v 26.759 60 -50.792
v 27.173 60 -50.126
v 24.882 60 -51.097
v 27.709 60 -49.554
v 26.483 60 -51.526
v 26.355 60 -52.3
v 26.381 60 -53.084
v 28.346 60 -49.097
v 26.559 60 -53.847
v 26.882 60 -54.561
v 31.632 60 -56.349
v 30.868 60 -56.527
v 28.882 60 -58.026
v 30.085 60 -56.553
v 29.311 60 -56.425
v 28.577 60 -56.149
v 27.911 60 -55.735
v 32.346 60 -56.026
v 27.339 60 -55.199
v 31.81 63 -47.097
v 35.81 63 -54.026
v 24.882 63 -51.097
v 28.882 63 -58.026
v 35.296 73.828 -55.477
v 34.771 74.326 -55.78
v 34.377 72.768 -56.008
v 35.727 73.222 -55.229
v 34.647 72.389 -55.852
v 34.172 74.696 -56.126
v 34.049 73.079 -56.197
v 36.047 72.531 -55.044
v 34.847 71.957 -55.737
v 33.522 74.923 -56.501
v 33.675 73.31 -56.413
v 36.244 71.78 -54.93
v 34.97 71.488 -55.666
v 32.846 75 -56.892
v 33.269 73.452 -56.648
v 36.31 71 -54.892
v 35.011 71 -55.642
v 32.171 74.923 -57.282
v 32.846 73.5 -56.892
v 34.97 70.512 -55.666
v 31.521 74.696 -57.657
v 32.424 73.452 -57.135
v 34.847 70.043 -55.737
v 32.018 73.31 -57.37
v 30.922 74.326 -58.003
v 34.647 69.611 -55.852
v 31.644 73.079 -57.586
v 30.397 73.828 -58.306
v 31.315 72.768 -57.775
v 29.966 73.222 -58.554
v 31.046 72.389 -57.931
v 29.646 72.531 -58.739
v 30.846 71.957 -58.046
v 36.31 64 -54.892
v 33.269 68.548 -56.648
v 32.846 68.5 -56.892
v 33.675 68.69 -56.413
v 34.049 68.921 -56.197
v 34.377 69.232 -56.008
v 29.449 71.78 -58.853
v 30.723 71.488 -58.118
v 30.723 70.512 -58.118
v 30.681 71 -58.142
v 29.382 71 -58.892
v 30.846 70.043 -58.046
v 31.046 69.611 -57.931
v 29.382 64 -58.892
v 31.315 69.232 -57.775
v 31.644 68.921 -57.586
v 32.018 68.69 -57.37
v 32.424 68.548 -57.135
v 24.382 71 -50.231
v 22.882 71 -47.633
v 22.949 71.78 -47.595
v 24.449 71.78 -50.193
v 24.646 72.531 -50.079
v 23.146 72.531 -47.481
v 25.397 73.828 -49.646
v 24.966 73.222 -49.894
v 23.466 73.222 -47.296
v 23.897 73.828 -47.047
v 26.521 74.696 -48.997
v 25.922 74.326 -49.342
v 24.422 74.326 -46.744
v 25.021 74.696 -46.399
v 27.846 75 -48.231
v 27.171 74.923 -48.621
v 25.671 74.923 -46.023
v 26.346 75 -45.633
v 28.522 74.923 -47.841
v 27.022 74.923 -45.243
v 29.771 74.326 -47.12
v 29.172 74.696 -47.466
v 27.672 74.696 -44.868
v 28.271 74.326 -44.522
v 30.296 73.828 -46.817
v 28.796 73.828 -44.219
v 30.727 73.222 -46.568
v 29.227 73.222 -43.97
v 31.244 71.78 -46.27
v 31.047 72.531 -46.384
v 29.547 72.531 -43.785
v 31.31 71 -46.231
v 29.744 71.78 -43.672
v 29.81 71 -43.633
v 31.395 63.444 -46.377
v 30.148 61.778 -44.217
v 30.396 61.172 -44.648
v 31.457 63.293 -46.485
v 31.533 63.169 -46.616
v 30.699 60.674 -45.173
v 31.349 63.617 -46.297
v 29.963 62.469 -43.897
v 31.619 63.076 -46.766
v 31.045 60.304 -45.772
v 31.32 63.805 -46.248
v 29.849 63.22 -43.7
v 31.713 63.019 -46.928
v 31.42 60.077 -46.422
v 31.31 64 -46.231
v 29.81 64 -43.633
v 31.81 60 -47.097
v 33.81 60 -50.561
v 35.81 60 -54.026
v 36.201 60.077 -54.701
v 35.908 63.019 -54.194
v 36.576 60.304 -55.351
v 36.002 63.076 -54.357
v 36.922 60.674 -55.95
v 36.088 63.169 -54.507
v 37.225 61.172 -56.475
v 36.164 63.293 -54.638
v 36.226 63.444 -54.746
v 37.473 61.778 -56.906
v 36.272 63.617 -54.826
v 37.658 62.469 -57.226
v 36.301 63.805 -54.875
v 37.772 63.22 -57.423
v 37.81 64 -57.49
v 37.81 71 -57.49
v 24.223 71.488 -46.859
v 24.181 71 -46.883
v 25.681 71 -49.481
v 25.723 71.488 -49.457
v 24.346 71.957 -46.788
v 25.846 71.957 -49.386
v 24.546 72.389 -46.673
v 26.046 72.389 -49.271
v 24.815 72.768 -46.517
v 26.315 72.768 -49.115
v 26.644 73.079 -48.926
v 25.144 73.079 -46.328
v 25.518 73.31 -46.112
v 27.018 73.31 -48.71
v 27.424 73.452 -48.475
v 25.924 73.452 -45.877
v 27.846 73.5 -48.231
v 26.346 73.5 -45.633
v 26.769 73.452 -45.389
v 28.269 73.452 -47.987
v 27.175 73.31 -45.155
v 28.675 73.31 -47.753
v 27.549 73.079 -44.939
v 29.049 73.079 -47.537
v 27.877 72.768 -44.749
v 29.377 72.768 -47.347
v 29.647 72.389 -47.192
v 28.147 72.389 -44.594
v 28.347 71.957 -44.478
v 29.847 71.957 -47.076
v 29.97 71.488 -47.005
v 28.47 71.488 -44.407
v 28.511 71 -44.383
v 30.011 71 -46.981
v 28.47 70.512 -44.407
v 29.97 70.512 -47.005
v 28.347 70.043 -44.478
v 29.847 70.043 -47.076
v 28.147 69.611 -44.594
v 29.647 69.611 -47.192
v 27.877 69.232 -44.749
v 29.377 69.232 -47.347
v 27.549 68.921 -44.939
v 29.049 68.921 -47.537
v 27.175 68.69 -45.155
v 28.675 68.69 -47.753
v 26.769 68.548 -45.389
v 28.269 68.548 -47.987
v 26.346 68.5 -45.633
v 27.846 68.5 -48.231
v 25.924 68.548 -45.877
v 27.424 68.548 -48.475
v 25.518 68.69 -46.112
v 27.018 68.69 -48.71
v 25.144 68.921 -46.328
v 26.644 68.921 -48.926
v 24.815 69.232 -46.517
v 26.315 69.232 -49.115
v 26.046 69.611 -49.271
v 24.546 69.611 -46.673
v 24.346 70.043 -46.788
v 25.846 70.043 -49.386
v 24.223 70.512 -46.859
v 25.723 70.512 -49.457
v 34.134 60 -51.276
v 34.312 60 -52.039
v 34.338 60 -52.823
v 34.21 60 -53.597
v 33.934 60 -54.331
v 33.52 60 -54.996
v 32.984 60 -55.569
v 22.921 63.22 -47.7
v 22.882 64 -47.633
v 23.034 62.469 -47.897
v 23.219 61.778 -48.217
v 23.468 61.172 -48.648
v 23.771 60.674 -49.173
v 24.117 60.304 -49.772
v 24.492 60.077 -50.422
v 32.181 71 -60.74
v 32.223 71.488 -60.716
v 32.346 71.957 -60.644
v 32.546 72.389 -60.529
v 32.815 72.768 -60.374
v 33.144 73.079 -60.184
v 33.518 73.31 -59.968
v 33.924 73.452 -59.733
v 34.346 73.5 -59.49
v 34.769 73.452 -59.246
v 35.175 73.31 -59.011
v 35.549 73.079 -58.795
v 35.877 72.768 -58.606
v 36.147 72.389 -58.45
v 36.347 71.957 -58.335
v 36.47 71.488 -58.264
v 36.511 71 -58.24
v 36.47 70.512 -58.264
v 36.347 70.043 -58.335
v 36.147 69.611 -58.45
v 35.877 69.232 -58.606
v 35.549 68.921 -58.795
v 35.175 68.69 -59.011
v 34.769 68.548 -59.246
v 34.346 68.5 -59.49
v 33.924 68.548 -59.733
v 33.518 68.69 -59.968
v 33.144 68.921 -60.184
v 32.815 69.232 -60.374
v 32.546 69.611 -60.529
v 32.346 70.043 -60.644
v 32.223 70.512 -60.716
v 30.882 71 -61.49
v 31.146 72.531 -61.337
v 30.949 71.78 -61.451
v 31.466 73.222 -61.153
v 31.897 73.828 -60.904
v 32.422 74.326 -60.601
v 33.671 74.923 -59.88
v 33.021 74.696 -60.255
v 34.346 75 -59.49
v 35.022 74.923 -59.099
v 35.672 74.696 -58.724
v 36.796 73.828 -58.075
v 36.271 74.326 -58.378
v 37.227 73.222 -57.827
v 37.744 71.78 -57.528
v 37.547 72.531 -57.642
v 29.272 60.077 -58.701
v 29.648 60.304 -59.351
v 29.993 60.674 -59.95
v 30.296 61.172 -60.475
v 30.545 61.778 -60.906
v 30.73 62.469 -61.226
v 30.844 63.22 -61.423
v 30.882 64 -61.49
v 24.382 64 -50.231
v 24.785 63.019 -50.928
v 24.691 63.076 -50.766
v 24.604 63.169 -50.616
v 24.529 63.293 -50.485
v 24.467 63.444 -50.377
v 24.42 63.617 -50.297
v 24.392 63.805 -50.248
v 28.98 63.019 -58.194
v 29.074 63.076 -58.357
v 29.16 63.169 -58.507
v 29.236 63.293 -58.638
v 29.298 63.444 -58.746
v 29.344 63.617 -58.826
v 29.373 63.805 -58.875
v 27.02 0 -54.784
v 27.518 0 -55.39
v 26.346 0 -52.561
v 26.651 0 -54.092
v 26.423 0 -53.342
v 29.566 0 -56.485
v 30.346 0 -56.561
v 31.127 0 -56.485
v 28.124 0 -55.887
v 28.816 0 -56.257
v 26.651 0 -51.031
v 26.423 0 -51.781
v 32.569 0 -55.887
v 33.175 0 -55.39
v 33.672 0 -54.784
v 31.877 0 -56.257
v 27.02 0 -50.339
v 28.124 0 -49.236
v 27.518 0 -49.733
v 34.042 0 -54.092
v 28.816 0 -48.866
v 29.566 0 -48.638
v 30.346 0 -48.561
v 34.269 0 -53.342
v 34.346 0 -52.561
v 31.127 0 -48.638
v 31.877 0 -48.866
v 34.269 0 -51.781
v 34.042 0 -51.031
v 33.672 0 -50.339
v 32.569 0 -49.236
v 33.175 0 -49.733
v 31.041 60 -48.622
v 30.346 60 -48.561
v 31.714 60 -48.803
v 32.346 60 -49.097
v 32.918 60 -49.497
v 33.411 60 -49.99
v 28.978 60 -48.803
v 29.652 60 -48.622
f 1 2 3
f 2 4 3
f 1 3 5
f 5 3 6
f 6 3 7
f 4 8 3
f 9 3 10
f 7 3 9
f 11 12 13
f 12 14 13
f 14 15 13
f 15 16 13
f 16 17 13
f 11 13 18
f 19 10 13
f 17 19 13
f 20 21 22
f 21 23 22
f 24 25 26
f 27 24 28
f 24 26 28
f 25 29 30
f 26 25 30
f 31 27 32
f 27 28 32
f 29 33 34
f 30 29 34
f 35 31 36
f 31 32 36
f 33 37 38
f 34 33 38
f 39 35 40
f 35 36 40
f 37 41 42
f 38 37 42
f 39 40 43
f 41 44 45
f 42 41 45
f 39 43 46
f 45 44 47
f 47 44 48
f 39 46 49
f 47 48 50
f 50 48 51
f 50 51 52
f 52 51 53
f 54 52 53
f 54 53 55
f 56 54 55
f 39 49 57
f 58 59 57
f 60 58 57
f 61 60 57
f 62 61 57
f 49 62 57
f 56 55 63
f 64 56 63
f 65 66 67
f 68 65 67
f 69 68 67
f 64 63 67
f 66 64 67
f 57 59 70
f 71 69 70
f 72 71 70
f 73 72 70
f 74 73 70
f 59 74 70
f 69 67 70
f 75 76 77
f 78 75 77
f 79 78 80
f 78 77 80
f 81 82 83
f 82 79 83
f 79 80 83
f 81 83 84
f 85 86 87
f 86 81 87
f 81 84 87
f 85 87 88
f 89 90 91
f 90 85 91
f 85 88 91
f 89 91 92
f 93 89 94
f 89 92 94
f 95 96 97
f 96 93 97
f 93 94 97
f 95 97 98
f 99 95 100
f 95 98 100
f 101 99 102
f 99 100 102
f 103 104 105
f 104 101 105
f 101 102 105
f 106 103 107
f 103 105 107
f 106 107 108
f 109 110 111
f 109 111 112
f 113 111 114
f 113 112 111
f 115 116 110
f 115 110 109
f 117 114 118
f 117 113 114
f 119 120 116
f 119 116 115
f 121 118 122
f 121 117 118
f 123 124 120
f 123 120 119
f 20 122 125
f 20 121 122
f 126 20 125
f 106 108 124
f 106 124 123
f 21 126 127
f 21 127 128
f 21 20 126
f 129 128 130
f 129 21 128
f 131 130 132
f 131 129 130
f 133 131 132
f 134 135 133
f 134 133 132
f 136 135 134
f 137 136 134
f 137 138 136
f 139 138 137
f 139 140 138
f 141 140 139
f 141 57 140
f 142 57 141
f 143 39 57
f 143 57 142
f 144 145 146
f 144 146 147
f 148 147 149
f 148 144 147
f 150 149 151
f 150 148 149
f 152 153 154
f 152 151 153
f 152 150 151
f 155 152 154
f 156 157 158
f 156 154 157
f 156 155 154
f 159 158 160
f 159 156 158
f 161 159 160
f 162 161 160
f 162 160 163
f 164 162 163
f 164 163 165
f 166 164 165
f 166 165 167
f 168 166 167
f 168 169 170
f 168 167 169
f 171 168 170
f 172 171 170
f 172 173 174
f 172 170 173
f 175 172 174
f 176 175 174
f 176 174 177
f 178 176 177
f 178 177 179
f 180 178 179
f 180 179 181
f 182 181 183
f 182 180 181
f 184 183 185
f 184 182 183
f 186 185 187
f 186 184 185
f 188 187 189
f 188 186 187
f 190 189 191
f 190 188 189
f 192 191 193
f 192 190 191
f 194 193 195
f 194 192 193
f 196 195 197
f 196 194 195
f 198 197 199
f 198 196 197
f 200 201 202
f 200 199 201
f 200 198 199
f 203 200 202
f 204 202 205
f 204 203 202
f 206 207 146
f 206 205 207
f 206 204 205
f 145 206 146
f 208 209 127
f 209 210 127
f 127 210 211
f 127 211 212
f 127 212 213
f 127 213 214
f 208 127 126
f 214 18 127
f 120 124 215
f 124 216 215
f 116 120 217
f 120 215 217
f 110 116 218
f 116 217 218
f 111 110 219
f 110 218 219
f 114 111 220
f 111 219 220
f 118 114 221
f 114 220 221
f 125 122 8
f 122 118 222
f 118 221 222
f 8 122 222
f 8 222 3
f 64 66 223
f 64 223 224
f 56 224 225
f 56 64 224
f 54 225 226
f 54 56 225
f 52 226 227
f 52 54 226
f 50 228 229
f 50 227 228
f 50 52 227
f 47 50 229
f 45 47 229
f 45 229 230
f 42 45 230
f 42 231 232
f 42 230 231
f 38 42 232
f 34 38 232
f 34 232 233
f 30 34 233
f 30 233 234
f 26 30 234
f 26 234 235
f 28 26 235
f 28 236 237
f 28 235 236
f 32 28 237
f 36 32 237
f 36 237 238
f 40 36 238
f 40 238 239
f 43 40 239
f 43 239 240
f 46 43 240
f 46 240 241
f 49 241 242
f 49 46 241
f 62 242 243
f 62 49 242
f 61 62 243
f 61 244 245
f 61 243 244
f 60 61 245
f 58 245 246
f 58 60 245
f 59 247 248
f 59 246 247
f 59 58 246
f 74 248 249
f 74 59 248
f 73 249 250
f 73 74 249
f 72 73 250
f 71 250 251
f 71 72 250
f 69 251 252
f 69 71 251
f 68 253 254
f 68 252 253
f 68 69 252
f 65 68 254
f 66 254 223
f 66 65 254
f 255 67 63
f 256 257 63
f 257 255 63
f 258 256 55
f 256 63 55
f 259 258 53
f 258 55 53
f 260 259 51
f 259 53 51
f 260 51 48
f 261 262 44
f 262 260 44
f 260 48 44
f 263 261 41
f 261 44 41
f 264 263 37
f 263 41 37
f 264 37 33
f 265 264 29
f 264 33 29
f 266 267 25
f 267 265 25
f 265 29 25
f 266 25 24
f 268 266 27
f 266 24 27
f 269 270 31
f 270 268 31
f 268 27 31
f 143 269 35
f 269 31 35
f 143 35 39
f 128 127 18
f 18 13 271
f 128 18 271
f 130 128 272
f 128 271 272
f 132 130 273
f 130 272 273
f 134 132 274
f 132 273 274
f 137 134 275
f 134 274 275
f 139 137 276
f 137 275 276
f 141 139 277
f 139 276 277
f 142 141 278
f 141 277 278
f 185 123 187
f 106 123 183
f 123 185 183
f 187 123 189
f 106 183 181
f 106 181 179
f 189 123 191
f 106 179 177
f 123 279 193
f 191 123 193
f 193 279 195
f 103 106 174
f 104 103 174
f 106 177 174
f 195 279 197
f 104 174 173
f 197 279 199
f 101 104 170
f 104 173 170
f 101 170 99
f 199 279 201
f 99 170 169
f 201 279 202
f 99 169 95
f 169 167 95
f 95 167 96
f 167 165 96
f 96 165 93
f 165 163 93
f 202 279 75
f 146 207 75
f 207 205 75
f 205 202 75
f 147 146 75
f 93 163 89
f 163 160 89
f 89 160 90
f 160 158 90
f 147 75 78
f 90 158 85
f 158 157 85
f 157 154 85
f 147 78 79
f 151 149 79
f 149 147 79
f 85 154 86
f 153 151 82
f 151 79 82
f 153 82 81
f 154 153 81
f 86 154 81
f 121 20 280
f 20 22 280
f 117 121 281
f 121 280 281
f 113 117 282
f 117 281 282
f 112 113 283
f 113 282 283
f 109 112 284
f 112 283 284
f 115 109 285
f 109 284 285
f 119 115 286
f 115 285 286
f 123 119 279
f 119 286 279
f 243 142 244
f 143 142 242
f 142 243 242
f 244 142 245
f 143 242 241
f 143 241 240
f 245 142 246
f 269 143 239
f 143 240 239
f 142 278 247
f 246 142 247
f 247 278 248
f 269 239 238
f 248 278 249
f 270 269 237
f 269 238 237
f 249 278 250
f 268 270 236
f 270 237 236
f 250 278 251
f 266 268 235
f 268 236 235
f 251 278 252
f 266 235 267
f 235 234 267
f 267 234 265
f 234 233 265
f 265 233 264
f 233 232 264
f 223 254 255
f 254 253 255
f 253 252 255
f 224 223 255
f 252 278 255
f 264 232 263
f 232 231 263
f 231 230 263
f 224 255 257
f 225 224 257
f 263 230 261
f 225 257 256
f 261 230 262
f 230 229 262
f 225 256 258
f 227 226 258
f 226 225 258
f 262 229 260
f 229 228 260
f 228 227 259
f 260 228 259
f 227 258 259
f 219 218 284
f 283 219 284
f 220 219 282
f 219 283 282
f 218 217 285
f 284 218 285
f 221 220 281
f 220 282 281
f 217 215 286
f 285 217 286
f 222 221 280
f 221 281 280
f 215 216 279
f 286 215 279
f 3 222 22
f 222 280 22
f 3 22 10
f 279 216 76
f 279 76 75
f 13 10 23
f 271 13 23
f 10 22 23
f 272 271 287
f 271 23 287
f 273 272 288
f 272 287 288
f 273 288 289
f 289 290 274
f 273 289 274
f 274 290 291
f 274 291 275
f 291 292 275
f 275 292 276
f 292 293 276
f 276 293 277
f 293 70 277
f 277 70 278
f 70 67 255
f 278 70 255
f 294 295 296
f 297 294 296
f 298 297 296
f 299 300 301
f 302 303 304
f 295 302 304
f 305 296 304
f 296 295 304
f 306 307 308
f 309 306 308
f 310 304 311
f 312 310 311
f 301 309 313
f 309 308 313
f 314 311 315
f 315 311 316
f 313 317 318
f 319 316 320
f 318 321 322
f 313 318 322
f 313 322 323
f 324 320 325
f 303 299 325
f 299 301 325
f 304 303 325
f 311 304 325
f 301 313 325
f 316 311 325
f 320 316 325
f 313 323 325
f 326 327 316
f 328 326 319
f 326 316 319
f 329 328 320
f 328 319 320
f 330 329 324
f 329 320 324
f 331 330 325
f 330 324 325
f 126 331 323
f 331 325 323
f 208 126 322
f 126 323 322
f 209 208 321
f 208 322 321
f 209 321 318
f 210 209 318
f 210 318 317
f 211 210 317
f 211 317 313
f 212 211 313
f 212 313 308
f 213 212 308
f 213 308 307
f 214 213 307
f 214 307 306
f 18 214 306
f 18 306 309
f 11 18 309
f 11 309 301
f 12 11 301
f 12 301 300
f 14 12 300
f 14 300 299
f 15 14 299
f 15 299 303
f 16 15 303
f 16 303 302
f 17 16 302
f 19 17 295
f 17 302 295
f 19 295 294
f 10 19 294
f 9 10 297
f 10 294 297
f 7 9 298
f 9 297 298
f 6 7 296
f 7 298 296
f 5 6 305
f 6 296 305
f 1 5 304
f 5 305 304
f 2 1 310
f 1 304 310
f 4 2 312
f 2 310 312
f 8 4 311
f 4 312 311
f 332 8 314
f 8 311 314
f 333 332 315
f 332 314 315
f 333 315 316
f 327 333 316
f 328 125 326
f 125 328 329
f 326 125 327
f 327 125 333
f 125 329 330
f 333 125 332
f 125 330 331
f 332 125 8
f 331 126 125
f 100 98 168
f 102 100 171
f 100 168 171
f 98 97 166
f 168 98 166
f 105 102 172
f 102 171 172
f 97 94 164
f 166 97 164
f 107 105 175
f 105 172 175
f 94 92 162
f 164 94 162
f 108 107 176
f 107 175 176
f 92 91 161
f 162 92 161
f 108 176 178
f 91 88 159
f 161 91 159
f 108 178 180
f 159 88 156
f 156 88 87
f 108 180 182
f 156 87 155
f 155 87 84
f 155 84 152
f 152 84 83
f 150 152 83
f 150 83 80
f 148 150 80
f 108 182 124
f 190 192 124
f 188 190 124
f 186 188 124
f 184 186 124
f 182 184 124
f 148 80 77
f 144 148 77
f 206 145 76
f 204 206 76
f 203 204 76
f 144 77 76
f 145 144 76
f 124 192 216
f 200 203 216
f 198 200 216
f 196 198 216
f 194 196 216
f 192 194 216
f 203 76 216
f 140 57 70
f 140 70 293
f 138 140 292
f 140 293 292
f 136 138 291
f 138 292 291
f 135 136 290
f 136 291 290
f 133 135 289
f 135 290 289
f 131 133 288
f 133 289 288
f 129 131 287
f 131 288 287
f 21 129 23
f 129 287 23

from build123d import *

# Parameters (mm, degrees)
BASE_LINK_OUTLINE_R     = 5
BASE_LINK_OUTLINE_R_2   = 4
BASE_LINK_DEPTH         = 60
SKETCH3_R               = 4
BOSS_EXTRUDE1_DEPTH     = 60
BOSS_EXTRUDE2_DEPTH     = 4
CUT_EXTRUDE1_DEPTH      = 78.510329968
CUT_EXTRUDE1_DEPTH_BACK = 78.510329968
SKETCH5_R               = 2.5


# Read off the part's stored shape, not the designer's step: base_link
with BuildPart() as part:
    # base_link outline → base_link (new body)
    with BuildSketch(Plane(origin=(0, 0, 0), x_dir=(1, 0, 0), z_dir=(0, 1, 0))):
        with Locations((30.34635, 52.561420024)):
            Circle(BASE_LINK_OUTLINE_R)
        with Locations((30.34635, 52.561420024)):
            Circle(BASE_LINK_OUTLINE_R_2, mode=Mode.SUBTRACT)
    extrude(amount=BASE_LINK_DEPTH)


with BuildPart() as body_2:
    # Sketch3 → Boss-Extrude1 (new body)
    with BuildSketch(Plane(origin=(0, 0, 0), x_dir=(1, 0, 0), z_dir=(0, 1, 0))):
        with Locations(Location((30.34635, 52.561420024, 0), (0, 0, 270))):
            Circle(SKETCH3_R)
    extrude(amount=BOSS_EXTRUDE1_DEPTH)

    # Sketch4 → Boss-Extrude2 (add, symmetric)
    with BuildSketch(Plane(origin=(0, 0, 0), x_dir=(-0.49999999999999994, 0, 0.8660254037844387), z_dir=(-0.8660254037844386, 0, -0.4999999999999999))):
        with BuildLine():
            Line((-68.6927, 75), (-65.6927, 75))
            Line((-65.6927, 75), (-65.6927, 64))
            ThreePointArc((-65.6927, 64), (-65.399806781, 63.292893219), (-64.6927, 63))
            Line((-64.6927, 63), (-56.6927, 63))
            ThreePointArc((-56.6927, 63), (-55.985593219, 63.292893219), (-55.6927, 64))
            Line((-55.6927, 64), (-55.6927, 75))
            Line((-55.6927, 75), (-52.6927, 75))
            Line((-52.6927, 75), (-52.6927, 64))
            ThreePointArc((-52.6927, 64), (-53.864272875, 61.171572875), (-56.6927, 60))
            Line((-56.6927, 60), (-64.6927, 60))
            ThreePointArc((-64.6927, 60), (-67.521127125, 61.171572875), (-68.6927, 64))
            Line((-68.6927, 64), (-68.6927, 75))
        make_face()
    extrude(amount=BOSS_EXTRUDE2_DEPTH, both=True)

    # Sketch5 → Cut-Extrude1 (cut, two sides: drawn at the far end of the back side and taken through both)
    with BuildSketch(Plane(origin=(34.34635, 0, -59.489623255), x_dir=(-0.8660254037844386, 0, -0.5), z_dir=(0.5000000000000001, 0, -0.8660254037844387)).offset(-CUT_EXTRUDE1_DEPTH_BACK)):
        with Locations((0, 71)):
            Circle(SKETCH5_R)
        with BuildLine():
            Line((-4, 71), (-4, 76))
            Line((-4, 76), (4, 76))
            Line((4, 76), (4, 71))
            ThreePointArc((4, 71), (0, 75), (-4, 71))
        make_face()
    extrude(amount=CUT_EXTRUDE1_DEPTH + CUT_EXTRUDE1_DEPTH_BACK, mode=Mode.SUBTRACT)


solid = body_2.part
